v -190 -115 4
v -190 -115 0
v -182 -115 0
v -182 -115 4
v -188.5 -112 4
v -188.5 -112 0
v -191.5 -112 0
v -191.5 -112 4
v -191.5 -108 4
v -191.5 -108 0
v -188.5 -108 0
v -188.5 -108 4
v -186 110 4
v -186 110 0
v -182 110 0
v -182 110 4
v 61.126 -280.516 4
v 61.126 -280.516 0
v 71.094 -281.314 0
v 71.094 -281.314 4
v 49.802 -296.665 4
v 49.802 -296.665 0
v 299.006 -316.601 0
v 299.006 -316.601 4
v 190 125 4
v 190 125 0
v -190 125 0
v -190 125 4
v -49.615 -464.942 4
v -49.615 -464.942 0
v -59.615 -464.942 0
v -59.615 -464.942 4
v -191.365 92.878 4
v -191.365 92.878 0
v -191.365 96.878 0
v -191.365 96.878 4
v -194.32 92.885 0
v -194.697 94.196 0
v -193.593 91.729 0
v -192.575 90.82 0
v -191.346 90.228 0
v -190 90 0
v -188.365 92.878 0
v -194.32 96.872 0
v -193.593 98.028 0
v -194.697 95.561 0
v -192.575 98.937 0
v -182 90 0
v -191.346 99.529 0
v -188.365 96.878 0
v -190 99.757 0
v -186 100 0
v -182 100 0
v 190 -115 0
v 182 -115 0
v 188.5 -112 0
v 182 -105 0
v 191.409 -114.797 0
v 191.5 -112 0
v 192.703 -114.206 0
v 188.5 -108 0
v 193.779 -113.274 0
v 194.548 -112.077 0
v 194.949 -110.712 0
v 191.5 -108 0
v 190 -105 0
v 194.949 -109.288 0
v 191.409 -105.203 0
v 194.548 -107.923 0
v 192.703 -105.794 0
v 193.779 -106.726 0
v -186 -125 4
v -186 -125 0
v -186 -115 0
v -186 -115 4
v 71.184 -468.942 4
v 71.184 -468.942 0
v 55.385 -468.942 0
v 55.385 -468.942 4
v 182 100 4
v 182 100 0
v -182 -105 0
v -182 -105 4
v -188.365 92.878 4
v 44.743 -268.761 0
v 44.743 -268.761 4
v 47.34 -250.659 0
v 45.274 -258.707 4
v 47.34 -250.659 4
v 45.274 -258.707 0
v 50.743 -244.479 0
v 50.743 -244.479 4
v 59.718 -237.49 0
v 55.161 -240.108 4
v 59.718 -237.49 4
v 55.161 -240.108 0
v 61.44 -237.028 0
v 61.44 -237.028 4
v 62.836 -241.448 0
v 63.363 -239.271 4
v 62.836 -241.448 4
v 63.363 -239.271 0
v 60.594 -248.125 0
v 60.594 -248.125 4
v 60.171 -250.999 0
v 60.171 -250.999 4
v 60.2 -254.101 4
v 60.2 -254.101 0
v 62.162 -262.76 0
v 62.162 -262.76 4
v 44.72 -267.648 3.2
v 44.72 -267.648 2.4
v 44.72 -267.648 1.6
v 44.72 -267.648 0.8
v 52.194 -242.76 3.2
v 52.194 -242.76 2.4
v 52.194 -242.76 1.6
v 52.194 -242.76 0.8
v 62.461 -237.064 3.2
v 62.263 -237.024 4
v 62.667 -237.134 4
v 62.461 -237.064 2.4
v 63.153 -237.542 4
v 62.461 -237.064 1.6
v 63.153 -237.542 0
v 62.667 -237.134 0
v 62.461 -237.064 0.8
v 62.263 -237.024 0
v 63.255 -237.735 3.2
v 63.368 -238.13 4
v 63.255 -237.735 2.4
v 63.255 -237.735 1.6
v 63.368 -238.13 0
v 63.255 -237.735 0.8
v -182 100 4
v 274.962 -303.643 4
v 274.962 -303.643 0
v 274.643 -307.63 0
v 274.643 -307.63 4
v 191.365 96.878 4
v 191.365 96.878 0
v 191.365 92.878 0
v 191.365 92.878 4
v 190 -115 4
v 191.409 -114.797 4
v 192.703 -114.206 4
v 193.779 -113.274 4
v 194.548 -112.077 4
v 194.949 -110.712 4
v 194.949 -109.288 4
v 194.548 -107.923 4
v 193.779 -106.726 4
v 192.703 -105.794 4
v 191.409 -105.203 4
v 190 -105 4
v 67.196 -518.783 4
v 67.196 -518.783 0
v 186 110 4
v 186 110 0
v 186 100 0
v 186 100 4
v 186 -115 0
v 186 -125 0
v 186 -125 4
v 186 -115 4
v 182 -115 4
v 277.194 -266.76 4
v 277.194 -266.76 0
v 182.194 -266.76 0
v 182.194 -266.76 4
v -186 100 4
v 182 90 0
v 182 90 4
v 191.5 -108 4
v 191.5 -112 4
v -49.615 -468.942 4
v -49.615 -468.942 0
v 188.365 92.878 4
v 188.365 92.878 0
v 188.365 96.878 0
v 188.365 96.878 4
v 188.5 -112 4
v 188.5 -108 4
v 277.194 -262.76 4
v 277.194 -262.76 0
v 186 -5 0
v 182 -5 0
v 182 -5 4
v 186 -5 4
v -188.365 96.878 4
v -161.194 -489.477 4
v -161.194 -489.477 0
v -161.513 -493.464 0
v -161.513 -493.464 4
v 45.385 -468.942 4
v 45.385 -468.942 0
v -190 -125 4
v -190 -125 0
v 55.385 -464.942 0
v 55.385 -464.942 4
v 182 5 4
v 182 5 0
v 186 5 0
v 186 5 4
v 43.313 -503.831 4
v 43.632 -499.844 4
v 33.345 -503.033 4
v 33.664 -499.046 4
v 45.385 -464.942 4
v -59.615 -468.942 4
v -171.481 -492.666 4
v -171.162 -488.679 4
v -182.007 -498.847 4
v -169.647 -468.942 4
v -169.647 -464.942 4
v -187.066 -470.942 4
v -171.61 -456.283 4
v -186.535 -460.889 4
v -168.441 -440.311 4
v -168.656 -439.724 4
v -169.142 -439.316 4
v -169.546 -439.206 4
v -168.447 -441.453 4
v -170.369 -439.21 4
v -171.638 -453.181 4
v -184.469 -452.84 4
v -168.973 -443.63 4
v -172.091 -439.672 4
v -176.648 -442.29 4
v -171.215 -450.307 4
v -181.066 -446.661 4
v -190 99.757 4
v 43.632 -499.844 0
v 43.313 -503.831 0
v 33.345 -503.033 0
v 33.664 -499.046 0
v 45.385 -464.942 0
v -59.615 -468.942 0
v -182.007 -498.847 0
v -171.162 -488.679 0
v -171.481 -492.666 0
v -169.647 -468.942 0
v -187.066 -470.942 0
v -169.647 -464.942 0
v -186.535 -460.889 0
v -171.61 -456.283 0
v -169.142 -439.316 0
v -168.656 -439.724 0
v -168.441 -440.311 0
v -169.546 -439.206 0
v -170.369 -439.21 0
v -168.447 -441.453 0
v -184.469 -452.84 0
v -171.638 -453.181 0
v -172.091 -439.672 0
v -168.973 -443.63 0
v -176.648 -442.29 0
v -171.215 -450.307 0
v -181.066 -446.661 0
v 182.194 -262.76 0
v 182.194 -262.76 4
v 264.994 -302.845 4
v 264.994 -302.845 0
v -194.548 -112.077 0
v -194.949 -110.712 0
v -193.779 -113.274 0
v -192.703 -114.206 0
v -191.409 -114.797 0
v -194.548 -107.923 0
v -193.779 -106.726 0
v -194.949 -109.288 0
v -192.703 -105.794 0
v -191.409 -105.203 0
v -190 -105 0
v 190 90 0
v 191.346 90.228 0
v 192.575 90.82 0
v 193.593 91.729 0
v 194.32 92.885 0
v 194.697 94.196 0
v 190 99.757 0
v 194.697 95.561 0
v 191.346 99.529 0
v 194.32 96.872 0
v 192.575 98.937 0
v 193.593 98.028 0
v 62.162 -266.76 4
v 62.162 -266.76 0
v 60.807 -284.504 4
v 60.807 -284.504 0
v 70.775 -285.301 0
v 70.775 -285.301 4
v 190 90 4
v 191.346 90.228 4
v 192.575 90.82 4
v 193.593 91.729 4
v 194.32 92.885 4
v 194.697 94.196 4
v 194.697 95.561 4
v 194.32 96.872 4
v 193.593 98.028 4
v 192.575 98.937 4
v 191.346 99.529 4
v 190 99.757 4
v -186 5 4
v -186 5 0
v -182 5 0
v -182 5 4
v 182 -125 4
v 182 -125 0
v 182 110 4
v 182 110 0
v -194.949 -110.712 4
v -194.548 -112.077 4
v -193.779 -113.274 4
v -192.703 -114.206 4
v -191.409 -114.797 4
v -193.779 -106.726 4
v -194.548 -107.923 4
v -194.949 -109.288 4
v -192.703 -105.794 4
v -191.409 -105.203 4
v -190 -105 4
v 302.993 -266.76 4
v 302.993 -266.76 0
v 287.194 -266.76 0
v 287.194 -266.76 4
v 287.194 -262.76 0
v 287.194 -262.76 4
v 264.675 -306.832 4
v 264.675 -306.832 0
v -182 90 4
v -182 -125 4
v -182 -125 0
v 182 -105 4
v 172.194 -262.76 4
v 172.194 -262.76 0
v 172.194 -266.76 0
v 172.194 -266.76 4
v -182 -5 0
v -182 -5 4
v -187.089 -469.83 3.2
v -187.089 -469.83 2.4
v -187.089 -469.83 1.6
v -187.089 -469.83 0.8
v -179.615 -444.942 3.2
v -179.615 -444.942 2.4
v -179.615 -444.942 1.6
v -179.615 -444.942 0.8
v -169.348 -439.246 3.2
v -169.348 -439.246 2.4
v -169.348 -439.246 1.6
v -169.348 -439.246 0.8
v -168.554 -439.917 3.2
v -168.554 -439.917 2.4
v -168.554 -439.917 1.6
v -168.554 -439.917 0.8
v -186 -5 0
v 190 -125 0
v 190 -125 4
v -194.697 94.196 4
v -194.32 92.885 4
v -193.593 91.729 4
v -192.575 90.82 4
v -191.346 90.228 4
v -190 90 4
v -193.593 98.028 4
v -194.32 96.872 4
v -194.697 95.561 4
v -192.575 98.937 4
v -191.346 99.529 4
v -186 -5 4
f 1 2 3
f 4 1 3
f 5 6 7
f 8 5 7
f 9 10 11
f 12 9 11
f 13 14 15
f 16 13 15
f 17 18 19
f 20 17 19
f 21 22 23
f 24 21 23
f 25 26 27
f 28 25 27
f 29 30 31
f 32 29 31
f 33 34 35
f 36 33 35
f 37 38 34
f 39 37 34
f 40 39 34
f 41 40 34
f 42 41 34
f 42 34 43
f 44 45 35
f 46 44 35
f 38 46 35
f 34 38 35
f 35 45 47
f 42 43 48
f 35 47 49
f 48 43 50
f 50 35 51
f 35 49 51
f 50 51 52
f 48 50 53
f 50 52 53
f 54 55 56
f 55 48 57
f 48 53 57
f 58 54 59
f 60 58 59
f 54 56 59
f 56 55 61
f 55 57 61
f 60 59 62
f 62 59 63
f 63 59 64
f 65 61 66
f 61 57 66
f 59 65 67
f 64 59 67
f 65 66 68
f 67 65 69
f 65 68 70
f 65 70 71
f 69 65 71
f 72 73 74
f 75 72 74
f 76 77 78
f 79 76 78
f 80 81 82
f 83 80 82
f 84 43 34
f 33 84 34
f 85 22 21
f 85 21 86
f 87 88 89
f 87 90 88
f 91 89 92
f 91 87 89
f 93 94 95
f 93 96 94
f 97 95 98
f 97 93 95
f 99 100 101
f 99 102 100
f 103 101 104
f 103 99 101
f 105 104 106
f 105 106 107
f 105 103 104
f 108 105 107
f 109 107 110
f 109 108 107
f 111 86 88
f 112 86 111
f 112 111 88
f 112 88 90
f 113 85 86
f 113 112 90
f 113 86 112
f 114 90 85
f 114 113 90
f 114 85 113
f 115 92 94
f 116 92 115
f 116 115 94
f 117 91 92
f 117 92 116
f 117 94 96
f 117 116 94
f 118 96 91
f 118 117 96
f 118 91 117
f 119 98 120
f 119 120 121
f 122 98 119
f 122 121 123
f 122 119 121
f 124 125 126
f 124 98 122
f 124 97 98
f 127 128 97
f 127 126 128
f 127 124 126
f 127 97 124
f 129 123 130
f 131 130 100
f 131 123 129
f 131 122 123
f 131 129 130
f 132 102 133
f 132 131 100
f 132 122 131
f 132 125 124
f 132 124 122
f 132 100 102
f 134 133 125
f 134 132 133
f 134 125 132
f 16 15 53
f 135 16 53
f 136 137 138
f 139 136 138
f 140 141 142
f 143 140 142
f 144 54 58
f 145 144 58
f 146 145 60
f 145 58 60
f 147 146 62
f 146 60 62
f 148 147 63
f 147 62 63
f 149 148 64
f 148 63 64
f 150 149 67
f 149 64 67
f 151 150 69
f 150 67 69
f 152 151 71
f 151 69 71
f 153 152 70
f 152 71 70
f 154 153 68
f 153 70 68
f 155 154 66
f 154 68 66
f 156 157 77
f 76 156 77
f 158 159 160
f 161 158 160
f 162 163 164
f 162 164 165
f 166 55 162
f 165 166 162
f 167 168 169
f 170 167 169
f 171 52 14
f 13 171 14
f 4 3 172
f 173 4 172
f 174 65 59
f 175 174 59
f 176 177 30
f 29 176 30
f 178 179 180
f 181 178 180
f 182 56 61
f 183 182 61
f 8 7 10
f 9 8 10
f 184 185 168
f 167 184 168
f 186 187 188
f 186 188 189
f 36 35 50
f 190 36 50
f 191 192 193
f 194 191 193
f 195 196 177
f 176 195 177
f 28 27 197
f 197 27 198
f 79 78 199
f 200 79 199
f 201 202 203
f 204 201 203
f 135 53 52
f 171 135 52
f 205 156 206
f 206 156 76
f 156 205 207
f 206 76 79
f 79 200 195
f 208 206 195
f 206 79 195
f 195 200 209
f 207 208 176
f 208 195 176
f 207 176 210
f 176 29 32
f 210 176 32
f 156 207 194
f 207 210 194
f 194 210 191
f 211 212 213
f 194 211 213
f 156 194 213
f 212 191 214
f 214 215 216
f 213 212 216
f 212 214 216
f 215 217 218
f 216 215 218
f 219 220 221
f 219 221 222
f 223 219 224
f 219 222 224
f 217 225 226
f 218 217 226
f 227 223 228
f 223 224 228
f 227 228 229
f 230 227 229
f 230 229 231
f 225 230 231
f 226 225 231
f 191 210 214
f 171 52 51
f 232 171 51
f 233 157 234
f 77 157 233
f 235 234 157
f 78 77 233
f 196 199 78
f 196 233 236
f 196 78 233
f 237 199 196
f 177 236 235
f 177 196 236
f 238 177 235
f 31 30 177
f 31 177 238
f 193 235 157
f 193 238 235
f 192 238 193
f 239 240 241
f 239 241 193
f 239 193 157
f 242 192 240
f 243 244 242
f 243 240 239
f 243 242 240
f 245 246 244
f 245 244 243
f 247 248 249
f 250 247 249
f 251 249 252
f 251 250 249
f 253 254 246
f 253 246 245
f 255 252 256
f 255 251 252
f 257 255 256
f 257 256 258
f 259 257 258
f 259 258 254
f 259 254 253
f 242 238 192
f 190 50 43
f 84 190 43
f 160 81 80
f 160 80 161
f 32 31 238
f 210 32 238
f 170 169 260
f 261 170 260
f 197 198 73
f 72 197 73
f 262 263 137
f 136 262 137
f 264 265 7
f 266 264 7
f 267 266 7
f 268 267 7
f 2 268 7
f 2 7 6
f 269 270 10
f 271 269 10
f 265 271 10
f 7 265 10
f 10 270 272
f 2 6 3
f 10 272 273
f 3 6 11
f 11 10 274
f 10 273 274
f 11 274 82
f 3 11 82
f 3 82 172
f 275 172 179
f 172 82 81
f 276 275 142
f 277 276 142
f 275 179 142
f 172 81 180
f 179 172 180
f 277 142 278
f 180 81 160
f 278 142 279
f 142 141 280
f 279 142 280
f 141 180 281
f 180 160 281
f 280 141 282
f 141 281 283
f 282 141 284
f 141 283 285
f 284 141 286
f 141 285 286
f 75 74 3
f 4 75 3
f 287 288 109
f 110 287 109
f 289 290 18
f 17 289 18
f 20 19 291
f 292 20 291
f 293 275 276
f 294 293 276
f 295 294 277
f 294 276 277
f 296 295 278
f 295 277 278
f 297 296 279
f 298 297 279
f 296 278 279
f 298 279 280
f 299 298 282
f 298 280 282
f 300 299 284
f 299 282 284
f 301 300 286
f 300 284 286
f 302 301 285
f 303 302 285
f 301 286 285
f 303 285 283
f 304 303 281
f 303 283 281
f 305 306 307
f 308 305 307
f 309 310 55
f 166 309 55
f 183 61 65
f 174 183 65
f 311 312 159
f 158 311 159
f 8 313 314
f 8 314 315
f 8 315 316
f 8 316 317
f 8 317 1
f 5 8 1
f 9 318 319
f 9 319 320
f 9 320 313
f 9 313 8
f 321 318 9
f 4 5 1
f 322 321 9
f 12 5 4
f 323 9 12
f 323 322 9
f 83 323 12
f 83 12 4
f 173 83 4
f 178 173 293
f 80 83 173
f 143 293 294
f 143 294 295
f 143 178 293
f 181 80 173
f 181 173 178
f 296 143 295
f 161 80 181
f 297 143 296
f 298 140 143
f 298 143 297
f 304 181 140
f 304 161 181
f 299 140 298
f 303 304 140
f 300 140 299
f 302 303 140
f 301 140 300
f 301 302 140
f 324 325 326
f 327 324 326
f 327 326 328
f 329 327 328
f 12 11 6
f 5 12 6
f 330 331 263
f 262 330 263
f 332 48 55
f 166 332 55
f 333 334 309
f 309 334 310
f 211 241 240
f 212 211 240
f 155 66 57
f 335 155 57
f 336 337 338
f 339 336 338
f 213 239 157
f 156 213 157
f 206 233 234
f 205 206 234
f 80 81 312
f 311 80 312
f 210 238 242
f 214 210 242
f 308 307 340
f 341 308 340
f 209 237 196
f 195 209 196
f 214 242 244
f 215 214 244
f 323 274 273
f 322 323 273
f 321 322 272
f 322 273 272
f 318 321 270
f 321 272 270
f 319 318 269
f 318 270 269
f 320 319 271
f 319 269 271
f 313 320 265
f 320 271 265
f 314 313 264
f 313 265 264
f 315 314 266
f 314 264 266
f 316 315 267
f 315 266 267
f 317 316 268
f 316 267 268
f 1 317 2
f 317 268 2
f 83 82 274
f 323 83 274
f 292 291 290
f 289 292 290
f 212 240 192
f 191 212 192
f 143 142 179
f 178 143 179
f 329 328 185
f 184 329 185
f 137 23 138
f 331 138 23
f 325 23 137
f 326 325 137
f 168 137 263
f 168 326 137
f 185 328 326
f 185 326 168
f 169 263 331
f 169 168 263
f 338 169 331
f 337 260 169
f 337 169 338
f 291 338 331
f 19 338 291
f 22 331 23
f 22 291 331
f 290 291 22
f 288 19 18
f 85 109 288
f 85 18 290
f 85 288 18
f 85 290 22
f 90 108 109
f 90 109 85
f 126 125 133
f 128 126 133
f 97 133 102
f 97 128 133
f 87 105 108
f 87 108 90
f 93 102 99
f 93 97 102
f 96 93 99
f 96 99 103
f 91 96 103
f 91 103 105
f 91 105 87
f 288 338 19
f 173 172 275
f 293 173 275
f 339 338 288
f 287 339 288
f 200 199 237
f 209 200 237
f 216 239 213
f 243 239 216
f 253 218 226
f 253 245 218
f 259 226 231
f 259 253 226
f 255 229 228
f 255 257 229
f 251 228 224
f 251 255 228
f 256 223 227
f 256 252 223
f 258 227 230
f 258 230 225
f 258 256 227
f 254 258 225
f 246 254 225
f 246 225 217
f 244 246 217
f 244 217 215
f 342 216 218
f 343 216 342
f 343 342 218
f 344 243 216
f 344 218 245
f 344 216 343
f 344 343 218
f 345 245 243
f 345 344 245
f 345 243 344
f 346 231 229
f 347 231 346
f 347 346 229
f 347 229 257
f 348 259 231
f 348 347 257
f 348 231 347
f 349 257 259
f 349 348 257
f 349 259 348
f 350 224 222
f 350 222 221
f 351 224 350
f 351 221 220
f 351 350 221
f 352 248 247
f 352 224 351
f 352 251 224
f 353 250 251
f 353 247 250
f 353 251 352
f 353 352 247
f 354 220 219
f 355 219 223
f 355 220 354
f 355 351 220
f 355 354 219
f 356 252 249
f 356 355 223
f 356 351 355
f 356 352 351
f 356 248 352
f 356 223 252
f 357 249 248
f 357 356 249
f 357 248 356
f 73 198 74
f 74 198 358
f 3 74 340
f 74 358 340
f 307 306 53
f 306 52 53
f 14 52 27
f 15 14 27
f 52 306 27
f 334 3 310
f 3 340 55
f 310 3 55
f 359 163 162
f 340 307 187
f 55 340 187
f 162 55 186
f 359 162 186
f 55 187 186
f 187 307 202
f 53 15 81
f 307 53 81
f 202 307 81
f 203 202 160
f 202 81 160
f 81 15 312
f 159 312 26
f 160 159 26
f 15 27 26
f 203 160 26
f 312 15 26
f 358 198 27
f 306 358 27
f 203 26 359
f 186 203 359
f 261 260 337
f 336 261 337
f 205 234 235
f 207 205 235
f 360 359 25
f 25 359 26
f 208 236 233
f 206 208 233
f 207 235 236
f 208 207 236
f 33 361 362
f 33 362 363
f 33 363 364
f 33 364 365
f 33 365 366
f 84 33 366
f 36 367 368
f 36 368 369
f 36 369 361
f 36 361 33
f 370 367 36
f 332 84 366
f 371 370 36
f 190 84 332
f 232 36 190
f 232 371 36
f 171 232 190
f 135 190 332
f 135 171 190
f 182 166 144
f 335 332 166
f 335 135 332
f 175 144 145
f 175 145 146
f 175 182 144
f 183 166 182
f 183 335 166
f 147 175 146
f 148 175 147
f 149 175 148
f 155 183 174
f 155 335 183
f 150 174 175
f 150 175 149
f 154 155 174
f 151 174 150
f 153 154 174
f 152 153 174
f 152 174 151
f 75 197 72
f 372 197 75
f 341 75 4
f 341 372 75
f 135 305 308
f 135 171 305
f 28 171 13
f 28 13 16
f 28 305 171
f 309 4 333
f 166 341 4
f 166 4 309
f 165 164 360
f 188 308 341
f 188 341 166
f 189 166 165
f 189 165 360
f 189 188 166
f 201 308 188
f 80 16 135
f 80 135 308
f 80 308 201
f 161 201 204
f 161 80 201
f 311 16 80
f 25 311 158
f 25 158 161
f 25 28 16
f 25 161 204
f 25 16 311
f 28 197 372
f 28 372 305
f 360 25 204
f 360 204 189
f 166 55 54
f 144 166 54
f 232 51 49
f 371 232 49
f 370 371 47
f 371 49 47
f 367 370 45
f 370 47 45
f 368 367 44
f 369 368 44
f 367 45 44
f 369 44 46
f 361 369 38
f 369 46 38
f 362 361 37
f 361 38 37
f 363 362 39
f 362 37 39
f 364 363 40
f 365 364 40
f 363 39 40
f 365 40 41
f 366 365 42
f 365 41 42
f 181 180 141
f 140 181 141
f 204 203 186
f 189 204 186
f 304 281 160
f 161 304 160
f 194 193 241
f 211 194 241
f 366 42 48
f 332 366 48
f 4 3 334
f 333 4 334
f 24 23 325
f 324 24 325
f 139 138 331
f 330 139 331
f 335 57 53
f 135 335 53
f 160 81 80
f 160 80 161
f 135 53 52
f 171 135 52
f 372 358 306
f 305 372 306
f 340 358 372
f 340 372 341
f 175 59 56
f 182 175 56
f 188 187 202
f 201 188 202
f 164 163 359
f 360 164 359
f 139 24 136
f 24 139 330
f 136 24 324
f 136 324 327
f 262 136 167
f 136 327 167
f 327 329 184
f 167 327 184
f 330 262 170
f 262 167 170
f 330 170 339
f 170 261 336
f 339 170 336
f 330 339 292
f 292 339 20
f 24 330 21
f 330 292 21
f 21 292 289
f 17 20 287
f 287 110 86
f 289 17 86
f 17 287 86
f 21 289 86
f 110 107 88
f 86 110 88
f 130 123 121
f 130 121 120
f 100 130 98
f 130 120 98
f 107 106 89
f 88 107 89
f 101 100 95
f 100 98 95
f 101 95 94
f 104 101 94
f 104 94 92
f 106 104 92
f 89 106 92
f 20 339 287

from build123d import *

# Parameters (mm, degrees)
F0_W     = 4
F0_H     = 85
F0_H_2   = 100
F0_H_3   = 15
F0_H_4   = 10
F0_W_2   = 1.6347891092
F0_H_5   = 4
F0_W_3   = 1.5
F1_DEPTH = 4
F2_DEPTH = 4
F3_DEPTH = 4
F4_DEPTH = 4
F5_DEPTH = 4


with BuildPart() as f1:
    # F0 (on Top) → F1 (new body)
    with BuildSketch(Plane.XY):
        with Locations((184, 47.5)):
            Rectangle(F0_W, F0_H)
        Polygon((182, -115), (182, -105), (8.8780487805, -7.5), (0, -12.5), align=None)
        Polygon((182, 110), (182, 125), (-182, 125), (-182, 110), (-182, 100), (0, -2.5), (182, 100), align=None)
        Polygon((-186, 110), (-186, 125), (-190, 125), (-190, 99.7567328215), (-186, 100), align=None)
        Polygon((182, 90), (182, 100), (0, -2.5), (8.8780487805, -7.5), align=None)
        with Locations((184, -55)):
            Rectangle(F0_W, F0_H_2)
        with Locations((-184, 47.5)):
            Rectangle(F0_W, F0_H)
        with Locations((184, 117.5)):
            Rectangle(F0_W, F0_H_3)
        Polygon((182, 5), (182, 90), (8.8780487805, -7.5), (182, -105), (182, -5), align=None)
        with Locations((-184, -55)):
            Rectangle(F0_W, F0_H_2)
        with Locations((-184, 117.5)):
            Rectangle(F0_W, F0_H_3)
        Polygon((-182, -105), (-8.8780487805, -7.5), (-182, 90), (-182, 5), (-182, -5), align=None)
        Polygon((182, -125), (182, -115), (0, -12.5), (-182, -115), (-182, -125), align=None)
        Polygon((0, -12.5), (-8.8780487805, -7.5), (-182, -105), (-182, -115), align=None)
        Polygon((8.8780487805, -7.5), (0, -2.5), (-8.8780487805, -7.5), (0, -12.5), align=None)
        Polygon((190, -105), (190, 90), (186, 90), (186, 5), (186, -5), (186, -105), align=None)
        Polygon((190, 99.7567328215), (190, 125), (186, 125), (186, 110), (186, 100), align=None)
        Polygon((-182, -115), (-182, -105), (-186, -105), (-190, -105), (-190, -108), (-188.5, -108), (-188.5, -112), (-190, -112), (-190, -115), (-186, -115), align=None)
        with Locations((184, 95)):
            Rectangle(F0_W, F0_H_4)
        with Locations((-188, -120)):
            Rectangle(F0_W, F0_H_4)
        Polygon((190, 96.8783664107), (190, 99.7567328215), (186, 100), (186, 90), (190, 90), (190, 92.8783664107), (188.3652108908, 92.8783664107), (188.3652108908, 96.8783664107), align=None)
        Polygon((190, -108), (190, -105), (186, -105), (186, -115), (190, -115), (190, -112), (188.5, -112), (188.5, -108), align=None)
        with Locations((184, -110)):
            Rectangle(F0_W, F0_H_4)
        with Locations((188, -120)):
            Rectangle(F0_W, F0_H_4)
        Polygon((-8.8780487805, -7.5), (0, -2.5), (-182, 100), (-186, 100), (-190, 99.7567328215), (-190, 96.8783664107), (-188.3652108908, 96.8783664107), (-188.3652108908, 92.8783664107), (-190, 92.8783664107), (-190, 90), (-186, 90), (-182, 90), align=None)
        Polygon((-186, 90), (-190, 90), (-190, -105), (-186, -105), (-186, -5), (-186, 5), align=None)
        Polygon((-188.5, -108), (-190, -108), (-190, -110), (-190, -112), (-188.5, -112), align=None)
        with Locations((-189.1826054454, 94.8783664107)):
            Rectangle(F0_W_2, F0_H_5)
        with Locations((189.1826054454, 94.8783664107)):
            Rectangle(F0_W_2, F0_H_5)
        with Locations((189.25, -110)):
            Rectangle(F0_W_3, F0_H_5)
    extrude(amount=F1_DEPTH)


with BuildPart() as f2:
    # F0 (on Top) → F2 (new body)
    with BuildSketch(Plane.XY):
        Polygon((-8.8780487805, -7.5), (0, -2.5), (-182, 100), (-186, 100), (-190, 99.7567328215), (-190, 96.8783664107), (-188.3652108908, 96.8783664107), (-188.3652108908, 92.8783664107), (-190, 92.8783664107), (-190, 90), (-186, 90), (-182, 90), align=None)
        with BuildLine():
            Line((-190, 96.8783664107), (-190, 99.7567328215))
            ThreePointArc((-190, 99.7567328215), (-194.7454390557, 94.8783664107), (-190, 90))
            Line((-190, 90), (-190, 92.8783664107))
            Line((-190, 92.8783664107), (-191.3652108908, 92.8783664107))
            Line((-191.3652108908, 92.8783664107), (-191.3652108908, 96.8783664107))
            Line((-191.3652108908, 96.8783664107), (-190, 96.8783664107))
        make_face()
        Polygon((8.8780487805, -7.5), (0, -2.5), (-8.8780487805, -7.5), (0, -12.5), align=None)
        Polygon((182, -115), (182, -105), (8.8780487805, -7.5), (0, -12.5), align=None)
        with Locations((184, -110)):
            Rectangle(F0_W, F0_H_4)
        with BuildLine():
            ThreePointArc((190, -115), (195, -110), (190, -105))
            Line((190, -105), (190, -108))
            Line((190, -108), (191.5, -108))
            Line((191.5, -108), (191.5, -112))
            Line((191.5, -112), (190, -112))
            Line((190, -112), (190, -115))
        make_face()
        Polygon((190, -108), (190, -105), (186, -105), (186, -115), (190, -115), (190, -112), (188.5, -112), (188.5, -108), align=None)
    extrude(amount=F2_DEPTH)


with BuildPart() as f3:
    # F0 (on Top) → F3 (new body)
    with BuildSketch(Plane.XY):
        Polygon((0, -12.5), (-8.8780487805, -7.5), (-182, -105), (-182, -115), align=None)
        Polygon((-182, -115), (-182, -105), (-186, -105), (-190, -105), (-190, -108), (-188.5, -108), (-188.5, -112), (-190, -112), (-190, -115), (-186, -115), align=None)
        with BuildLine():
            Line((-190, -108), (-190, -105))
            ThreePointArc((-190, -105), (-195, -110), (-190, -115))
            Line((-190, -115), (-190, -112))
            Line((-190, -112), (-191.5, -112))
            Line((-191.5, -112), (-191.5, -108))
            Line((-191.5, -108), (-190, -108))
        make_face()
        Polygon((8.8780487805, -7.5), (0, -2.5), (-8.8780487805, -7.5), (0, -12.5), align=None)
        Polygon((182, 90), (182, 100), (0, -2.5), (8.8780487805, -7.5), align=None)
        with Locations((184, 95)):
            Rectangle(F0_W, F0_H_4)
        Polygon((190, 96.8783664107), (190, 99.7567328215), (186, 100), (186, 90), (190, 90), (190, 92.8783664107), (188.3652108908, 92.8783664107), (188.3652108908, 96.8783664107), align=None)
        with BuildLine():
            ThreePointArc((190, 90), (194.7454390557, 94.8783664107), (190, 99.7567328215))
            Line((190, 99.7567328215), (190, 96.8783664107))
            Line((190, 96.8783664107), (191.3652108908, 96.8783664107))
            Line((191.3652108908, 96.8783664107), (191.3652108908, 92.8783664107))
            Line((191.3652108908, 92.8783664107), (190, 92.8783664107))
            Line((190, 92.8783664107), (190, 90))
        make_face()
    extrude(amount=F3_DEPTH)


with BuildPart() as f4:
    # F0 (on Top) → F4 (new body)
    with BuildSketch(Plane.XY):
        with BuildLine():
            add(Edge.make_bspline(
                [(49.8018445918, -296.664855781), (46.8551157009, -286.9380358047), (42.5517620483, -266.389684647), (48.3215650847, -242.4866813126), (64.9195225978, -234.4008538552), (61.9733688582, -244.9728526655), (58.372137132, -251.6741404231), (62.1620829211, -262.7603751421)],
                knots=[0, 0, 0, 0, 0.268773055, 0.5053433296, 0.6718951956, 0.7850531186, 1, 1, 1, 1], degree=3))
            Line((49.8018445918, -296.664855781), (299.0056659804, -316.6011394198))
            Line((299.0056659804, -316.6011394198), (302.9929227081, -266.7603751421))
            Line((302.9929227081, -266.7603751421), (287.1939227081, -266.7603751421))
            Line((287.1939227081, -266.7603751421), (287.1939227081, -262.7603751421))
            Line((287.1939227081, -262.7603751421), (277.1939227081, -262.7603751421))
            Line((277.1939227081, -262.7603751421), (277.1939227081, -266.7603751421))
            Line((277.1939227081, -266.7603751421), (182.1939227081, -266.7603751421))
            Line((182.1939227081, -266.7603751421), (182.1939227081, -262.7603751421))
            Line((182.1939227081, -262.7603751421), (172.1939227081, -262.7603751421))
            Line((172.1939227081, -262.7603751421), (172.1939227081, -266.7603751421))
            Line((172.1939227081, -266.7603751421), (62.1620829211, -266.7603751421))
            Line((62.1620829211, -266.7603751421), (62.1620829211, -262.7603751421))
        make_face()
        Polygon((60.3280570349, -290.4845876194), (60.6470375731, -286.4973264772), (70.6151904286, -287.2947778227), (70.2962098904, -291.2820389649), align=None, mode=Mode.SUBTRACT)
        Polygon((70.7747174875, -285.3011501948), (60.8065646316, -284.5036988492), (61.1255083804, -280.5164347638), (71.0936612364, -281.3138861094), align=None, mode=Mode.SUBTRACT)
        Polygon((274.6434997834, -307.6298040571), (264.6753469279, -306.8323527115), (264.9943274661, -302.8450915693), (274.9624803216, -303.6425429148), align=None, mode=Mode.SUBTRACT)
        Polygon((275.440951129, -297.6616512015), (275.1219705907, -301.6489123437), (265.1538177352, -300.8514609982), (265.4727982734, -296.864199856), align=None, mode=Mode.SUBTRACT)
        Polygon((265.1538177352, -300.8514609982), (275.1219705907, -301.6489123437), (275.440951129, -297.6616512015), (265.4727982734, -296.864199856), align=None)
        Polygon((70.6151904286, -287.2947778227), (60.6470375731, -286.4973264772), (60.3280570349, -290.4845876194), (70.2962098904, -291.2820389649), align=None)
    extrude(amount=F4_DEPTH)


with BuildPart() as f5:
    # F0 (on Top) → F5 (new body)
    with BuildSketch(Plane.XY):
        with BuildLine():
            add(Edge.make_bspline(
                [(-182.0074226772, -498.846749809), (-184.9541515682, -489.1199298326), (-189.2575052207, -468.571578675), (-183.4877021844, -444.6685753405), (-166.8897446713, -436.5827478832), (-169.8358984108, -447.1547466935), (-173.4371301371, -453.8560344511), (-169.6471843479, -464.94226917)],
                knots=[0, 0, 0, 0, 0.268773055, 0.5053433296, 0.6718951956, 0.7850531186, 1, 1, 1, 1], degree=3))
            Line((-182.0074226772, -498.846749809), (67.1963987113, -518.7830334478))
            Line((67.1963987113, -518.7830334478), (71.1836554391, -468.94226917))
            Line((71.1836554391, -468.94226917), (55.3846554391, -468.94226917))
            Line((55.3846554391, -468.94226917), (55.3846554391, -464.94226917))
            Line((55.3846554391, -464.94226917), (45.3846554391, -464.94226917))
            Line((45.3846554391, -464.94226917), (45.3846554391, -468.94226917))
            Line((45.3846554391, -468.94226917), (-49.6153445609, -468.94226917))
            Line((-49.6153445609, -468.94226917), (-49.6153445609, -464.94226917))
            Line((-49.6153445609, -464.94226917), (-59.6153445609, -464.94226917))
            Line((-59.6153445609, -464.94226917), (-59.6153445609, -468.94226917))
            Line((-59.6153445609, -468.94226917), (-169.6471843479, -468.94226917))
            Line((-169.6471843479, -468.94226917), (-169.6471843479, -464.94226917))
        make_face()
        Polygon((-171.4812102342, -492.6664816473), (-171.162229696, -488.6792205051), (-161.1940768404, -489.4766718507), (-161.5130573786, -493.4639329929), align=None, mode=Mode.SUBTRACT)
        Polygon((-161.0345497815, -487.4830442227), (-171.0027026375, -486.6855928771), (-170.6837588886, -482.6983287918), (-160.7156060327, -483.4957801374), align=None, mode=Mode.SUBTRACT)
        Polygon((42.8342325144, -509.811698085), (32.8660796588, -509.0142467395), (33.185060197, -505.0269855972), (43.1532130526, -505.8244369428), align=None, mode=Mode.SUBTRACT)
        Polygon((43.6316838599, -499.8435452295), (43.3127033217, -503.8308063717), (33.3445504662, -503.0333550261), (33.6635310044, -499.0460938839), align=None, mode=Mode.SUBTRACT)
        Polygon((-170.6837588886, -482.6983287918), (-171.0027026375, -486.6855928771), (-161.0345497815, -487.4830442227), (-160.7156060327, -483.4957801374), align=None)
        Polygon((33.185060197, -505.0269855972), (32.8660796588, -509.0142467395), (42.8342325144, -509.811698085), (43.1532130526, -505.8244369428), align=None)
    extrude(amount=F5_DEPTH)


solid = Compound([f1.part, f2.part, f3.part, f4.part, f5.part])
